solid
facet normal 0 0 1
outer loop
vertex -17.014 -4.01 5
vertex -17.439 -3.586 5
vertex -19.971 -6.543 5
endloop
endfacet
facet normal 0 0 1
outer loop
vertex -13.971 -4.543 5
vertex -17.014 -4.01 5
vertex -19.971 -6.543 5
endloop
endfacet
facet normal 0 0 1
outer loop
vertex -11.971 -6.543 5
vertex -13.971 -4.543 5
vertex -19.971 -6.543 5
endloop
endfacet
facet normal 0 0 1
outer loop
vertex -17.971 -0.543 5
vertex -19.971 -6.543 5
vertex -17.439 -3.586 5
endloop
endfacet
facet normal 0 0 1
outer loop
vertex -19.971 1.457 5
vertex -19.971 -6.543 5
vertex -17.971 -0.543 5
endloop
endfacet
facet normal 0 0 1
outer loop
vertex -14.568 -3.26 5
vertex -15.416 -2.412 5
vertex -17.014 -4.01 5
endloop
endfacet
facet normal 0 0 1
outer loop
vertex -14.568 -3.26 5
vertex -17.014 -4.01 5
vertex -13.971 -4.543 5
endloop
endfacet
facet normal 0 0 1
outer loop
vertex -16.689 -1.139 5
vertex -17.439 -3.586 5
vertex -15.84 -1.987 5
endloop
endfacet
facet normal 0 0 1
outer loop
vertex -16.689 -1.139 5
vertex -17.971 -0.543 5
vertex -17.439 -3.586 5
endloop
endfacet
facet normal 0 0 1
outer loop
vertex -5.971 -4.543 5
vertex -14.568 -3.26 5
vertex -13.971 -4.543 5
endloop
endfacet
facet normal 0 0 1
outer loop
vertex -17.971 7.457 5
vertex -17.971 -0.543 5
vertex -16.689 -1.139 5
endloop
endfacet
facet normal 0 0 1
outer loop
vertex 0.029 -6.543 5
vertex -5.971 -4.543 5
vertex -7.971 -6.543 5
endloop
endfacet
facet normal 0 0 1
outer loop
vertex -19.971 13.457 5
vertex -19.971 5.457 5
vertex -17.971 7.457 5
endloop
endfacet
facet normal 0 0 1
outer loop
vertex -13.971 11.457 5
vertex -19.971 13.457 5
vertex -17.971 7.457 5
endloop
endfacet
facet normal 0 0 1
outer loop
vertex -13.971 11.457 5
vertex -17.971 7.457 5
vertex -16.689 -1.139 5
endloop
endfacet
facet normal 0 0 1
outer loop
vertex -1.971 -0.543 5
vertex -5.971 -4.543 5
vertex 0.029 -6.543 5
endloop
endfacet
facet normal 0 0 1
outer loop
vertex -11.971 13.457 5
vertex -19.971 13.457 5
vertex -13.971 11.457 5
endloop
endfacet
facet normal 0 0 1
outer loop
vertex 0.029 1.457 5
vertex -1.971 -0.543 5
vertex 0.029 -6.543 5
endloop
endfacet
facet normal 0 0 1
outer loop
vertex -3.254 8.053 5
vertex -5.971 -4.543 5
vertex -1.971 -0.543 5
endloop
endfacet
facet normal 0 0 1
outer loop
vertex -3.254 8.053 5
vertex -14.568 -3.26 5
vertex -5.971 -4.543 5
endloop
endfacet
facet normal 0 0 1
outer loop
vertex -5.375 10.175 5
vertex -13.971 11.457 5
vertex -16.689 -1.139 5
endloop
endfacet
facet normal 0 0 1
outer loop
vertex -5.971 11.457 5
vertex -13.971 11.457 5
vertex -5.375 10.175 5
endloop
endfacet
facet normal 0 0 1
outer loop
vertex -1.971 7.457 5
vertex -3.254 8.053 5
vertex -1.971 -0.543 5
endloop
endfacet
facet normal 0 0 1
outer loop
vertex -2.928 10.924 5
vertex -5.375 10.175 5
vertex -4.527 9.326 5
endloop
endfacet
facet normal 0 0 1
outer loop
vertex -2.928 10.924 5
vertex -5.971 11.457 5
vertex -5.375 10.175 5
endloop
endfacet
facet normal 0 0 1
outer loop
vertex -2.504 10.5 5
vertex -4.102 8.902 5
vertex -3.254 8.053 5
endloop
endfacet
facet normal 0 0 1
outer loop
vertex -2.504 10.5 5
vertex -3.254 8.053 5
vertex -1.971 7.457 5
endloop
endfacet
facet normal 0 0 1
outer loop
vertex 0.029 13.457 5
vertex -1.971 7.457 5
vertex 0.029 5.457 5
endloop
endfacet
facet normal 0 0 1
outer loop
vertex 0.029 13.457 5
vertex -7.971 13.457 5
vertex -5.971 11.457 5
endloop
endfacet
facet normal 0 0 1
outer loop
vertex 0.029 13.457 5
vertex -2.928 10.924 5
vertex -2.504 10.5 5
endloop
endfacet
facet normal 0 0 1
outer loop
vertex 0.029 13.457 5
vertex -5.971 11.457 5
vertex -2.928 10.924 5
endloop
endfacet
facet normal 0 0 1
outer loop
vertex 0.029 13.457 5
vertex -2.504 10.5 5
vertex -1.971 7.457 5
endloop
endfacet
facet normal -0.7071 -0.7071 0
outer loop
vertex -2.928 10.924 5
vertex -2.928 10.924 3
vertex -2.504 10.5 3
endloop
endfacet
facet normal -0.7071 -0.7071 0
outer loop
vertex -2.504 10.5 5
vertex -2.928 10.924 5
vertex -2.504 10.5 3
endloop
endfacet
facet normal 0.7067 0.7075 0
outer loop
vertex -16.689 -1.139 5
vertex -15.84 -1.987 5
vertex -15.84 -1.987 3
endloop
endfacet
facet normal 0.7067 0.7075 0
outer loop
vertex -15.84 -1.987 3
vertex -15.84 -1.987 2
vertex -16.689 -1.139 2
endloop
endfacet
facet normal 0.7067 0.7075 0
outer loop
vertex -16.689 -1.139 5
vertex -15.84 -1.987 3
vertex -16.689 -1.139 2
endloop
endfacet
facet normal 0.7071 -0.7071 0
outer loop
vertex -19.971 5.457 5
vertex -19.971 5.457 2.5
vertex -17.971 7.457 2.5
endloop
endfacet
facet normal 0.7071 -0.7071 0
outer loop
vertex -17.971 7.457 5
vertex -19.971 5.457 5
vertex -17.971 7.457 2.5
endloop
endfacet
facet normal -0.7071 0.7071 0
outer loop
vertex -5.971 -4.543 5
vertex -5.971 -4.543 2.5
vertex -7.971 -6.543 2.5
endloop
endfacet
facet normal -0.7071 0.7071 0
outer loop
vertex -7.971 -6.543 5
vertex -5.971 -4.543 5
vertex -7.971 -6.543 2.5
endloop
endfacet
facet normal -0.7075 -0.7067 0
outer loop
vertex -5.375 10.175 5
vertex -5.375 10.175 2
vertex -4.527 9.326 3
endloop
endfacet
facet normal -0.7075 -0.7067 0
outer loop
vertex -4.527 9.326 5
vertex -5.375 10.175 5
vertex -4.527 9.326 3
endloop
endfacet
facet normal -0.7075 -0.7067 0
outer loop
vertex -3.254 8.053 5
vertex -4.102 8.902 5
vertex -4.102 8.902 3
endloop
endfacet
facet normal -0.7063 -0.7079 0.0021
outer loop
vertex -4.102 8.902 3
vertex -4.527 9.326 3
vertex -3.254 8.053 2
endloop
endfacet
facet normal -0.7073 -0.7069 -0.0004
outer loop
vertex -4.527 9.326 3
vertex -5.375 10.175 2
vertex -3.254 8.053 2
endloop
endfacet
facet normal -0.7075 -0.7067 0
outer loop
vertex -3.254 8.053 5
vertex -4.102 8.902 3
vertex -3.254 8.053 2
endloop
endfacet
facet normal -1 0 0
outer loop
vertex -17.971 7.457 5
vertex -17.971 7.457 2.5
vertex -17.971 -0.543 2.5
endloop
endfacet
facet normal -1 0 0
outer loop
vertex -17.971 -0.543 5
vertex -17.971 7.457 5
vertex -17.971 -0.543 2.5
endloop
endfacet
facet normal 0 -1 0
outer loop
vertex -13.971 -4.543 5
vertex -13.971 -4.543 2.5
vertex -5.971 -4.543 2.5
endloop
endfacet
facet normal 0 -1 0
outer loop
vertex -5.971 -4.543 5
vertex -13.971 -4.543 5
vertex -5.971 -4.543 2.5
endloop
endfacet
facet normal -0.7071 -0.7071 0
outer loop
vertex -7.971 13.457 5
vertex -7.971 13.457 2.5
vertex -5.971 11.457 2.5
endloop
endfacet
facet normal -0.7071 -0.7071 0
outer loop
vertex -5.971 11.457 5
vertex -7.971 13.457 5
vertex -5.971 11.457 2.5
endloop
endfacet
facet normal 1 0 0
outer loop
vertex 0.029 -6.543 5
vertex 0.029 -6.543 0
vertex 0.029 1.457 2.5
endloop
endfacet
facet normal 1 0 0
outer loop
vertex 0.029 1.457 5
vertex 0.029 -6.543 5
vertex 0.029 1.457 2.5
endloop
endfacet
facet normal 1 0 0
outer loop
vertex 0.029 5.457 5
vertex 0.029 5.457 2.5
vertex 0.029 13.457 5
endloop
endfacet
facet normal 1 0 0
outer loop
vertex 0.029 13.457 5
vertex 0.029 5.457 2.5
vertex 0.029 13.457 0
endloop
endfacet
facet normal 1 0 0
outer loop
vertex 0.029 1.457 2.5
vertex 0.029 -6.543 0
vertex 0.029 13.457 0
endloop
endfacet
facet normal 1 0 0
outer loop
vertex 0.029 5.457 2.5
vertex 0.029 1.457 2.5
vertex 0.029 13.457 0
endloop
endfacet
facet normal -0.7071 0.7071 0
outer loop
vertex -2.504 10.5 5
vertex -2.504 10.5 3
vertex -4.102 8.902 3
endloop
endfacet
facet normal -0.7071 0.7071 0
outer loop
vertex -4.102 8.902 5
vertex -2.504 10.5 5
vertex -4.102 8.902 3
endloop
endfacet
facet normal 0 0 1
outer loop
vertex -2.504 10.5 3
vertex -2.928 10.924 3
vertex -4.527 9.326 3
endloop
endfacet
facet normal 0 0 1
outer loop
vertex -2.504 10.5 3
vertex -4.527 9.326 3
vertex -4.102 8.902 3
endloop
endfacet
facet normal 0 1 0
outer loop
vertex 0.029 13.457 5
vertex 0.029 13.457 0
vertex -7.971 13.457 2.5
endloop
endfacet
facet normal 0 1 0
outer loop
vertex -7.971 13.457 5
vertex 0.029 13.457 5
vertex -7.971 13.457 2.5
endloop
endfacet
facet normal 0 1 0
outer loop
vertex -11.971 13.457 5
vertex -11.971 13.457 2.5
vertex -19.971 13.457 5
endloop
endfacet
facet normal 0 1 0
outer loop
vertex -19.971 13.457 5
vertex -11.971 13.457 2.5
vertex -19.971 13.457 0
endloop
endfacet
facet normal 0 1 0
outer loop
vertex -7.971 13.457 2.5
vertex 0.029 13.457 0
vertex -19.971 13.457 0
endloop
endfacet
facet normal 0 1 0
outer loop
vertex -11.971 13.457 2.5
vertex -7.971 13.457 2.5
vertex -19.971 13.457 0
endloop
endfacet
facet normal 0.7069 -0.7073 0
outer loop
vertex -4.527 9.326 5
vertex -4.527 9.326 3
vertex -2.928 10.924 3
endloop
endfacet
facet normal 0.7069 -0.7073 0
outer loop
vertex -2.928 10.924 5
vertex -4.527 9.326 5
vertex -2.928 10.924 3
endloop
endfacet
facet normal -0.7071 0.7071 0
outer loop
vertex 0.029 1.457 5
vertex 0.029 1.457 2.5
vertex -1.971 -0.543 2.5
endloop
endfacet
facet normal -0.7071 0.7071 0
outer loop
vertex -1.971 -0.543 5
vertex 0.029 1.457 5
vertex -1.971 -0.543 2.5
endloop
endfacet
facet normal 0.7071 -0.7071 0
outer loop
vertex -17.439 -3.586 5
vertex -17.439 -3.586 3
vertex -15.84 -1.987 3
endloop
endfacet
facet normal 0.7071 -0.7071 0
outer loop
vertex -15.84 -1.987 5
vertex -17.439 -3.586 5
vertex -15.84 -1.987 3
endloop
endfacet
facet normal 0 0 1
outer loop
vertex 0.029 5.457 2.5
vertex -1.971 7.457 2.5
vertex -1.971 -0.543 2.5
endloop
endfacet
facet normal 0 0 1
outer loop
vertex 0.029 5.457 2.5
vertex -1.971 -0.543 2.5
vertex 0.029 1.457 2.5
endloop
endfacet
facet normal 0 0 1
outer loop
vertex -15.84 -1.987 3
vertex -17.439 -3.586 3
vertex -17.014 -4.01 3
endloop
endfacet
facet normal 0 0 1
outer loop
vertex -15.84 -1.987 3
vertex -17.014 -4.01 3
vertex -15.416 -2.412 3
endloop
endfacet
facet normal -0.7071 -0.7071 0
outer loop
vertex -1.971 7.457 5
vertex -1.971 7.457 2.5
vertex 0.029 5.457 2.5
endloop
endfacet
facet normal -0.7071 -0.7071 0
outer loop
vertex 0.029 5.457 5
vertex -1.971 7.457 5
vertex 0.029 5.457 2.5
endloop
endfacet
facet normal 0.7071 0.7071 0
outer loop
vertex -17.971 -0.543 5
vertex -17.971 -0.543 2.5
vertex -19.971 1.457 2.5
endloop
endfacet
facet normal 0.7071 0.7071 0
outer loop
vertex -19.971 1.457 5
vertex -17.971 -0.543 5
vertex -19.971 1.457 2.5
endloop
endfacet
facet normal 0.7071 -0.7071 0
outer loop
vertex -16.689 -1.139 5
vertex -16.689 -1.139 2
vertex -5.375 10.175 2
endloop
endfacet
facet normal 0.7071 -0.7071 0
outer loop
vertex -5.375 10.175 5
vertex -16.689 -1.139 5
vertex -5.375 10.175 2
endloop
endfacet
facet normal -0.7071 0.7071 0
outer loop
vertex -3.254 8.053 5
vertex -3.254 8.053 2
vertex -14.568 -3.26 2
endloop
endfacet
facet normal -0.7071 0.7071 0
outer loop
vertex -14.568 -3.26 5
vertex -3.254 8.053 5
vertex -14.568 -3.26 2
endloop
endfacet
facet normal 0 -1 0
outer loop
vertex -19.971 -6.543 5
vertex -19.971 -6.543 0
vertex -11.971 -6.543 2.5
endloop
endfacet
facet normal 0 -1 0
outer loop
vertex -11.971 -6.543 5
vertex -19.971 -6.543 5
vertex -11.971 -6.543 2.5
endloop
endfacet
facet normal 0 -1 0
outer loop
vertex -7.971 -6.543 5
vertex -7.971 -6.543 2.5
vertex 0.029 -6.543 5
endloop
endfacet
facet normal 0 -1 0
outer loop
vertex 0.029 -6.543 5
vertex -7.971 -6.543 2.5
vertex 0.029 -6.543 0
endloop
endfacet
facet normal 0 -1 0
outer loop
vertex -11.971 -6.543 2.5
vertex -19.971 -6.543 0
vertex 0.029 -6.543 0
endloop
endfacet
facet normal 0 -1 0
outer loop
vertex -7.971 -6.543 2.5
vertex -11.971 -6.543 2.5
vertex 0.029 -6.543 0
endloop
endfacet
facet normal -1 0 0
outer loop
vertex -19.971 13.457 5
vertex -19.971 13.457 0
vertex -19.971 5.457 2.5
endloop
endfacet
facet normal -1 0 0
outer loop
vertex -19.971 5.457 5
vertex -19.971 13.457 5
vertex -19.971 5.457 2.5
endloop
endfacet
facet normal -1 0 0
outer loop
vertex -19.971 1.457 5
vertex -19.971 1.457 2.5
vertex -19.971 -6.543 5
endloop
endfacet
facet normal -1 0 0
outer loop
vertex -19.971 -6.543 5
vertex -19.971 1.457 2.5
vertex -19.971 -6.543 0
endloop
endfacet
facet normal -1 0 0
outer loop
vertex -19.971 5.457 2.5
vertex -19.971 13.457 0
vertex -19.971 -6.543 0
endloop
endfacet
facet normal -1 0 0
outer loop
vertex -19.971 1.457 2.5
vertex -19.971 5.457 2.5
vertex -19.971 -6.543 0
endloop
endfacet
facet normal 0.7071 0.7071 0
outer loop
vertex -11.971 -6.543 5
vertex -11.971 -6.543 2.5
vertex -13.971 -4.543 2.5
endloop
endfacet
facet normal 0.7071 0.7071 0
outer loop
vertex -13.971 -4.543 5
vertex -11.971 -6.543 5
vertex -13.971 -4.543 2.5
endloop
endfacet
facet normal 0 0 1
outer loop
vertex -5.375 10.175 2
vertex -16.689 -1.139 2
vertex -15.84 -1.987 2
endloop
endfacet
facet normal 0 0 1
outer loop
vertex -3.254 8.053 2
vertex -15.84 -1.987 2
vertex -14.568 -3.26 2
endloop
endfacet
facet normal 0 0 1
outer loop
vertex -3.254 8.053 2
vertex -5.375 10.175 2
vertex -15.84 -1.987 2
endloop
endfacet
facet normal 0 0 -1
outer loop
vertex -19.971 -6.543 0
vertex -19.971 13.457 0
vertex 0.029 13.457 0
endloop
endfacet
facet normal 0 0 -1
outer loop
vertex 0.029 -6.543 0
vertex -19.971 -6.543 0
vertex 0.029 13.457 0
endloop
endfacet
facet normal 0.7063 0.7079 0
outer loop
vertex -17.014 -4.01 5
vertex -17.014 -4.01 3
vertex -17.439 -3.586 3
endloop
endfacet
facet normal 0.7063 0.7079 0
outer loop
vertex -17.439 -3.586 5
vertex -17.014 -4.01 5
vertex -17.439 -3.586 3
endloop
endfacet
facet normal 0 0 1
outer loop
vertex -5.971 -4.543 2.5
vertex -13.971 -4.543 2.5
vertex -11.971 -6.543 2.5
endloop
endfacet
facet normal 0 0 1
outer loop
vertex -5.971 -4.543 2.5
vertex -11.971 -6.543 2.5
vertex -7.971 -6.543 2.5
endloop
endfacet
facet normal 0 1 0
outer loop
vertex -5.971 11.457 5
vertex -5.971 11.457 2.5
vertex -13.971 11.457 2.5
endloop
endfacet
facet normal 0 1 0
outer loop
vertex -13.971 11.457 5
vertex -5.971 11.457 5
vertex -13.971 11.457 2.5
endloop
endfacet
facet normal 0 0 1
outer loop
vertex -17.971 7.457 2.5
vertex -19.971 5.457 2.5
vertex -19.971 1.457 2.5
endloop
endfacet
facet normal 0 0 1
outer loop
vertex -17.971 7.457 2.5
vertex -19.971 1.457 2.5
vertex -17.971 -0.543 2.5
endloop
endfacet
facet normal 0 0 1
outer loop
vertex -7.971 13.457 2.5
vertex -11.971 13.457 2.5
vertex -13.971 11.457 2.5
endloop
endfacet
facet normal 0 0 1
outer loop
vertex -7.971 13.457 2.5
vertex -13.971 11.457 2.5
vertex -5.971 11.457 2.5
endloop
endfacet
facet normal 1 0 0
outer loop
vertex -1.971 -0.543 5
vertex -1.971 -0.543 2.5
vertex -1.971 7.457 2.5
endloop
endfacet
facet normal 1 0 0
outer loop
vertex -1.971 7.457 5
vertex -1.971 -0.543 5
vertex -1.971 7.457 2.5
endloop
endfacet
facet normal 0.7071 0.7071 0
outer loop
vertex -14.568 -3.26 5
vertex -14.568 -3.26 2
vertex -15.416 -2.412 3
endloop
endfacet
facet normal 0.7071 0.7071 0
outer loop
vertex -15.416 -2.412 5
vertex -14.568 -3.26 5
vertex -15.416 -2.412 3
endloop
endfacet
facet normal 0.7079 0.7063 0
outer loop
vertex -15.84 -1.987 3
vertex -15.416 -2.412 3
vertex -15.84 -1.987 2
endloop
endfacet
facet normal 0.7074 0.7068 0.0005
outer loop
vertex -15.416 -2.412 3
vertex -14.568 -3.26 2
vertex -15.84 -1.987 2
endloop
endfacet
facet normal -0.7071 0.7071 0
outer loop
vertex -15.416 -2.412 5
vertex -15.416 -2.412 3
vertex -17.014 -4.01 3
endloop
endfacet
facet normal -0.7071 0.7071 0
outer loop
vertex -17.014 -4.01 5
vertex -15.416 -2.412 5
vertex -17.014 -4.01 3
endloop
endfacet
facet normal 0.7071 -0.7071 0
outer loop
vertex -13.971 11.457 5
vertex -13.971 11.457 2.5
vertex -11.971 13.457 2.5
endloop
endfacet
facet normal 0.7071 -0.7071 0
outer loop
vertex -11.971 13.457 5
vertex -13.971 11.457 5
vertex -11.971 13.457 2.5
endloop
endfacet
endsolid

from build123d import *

# Parameters (mm, degrees)
F1_DEPTH = 5
F2_DEPTH = 2
F3_DEPTH = 3
F4_DEPTH = 2.5


with BuildPart() as f1:
    # F0 (on Top) → F1 (new body)
    with BuildSketch(Plane.XY):
        Polygon((-5.9713595426, 11.4572308195), (-13.9713595426, 11.4572308195), (-17.9713595426, 11.4572308195), (-17.9713595426, 7.4572308195), (-17.9713595426, -0.5427691805), (-17.9713595426, -2.421448837), (-16.6888739638, -1.1389632582), (-5.3751654648, 10.1747452407), (-4.0926798861, 11.4572308195), align=None)
        Polygon((-2.3956236113, 11.4572308195), (-4.0926798861, 11.4572308195), (-5.3751654648, 10.1747452407), (-4.5266373274, 9.3262171033), (-2.9283770403, 10.9244773904), align=None)
        Polygon((-3.2538451213, 8.0534248972), (-1.9713595426, 9.3359104759), (-1.9713595426, 11.0329667508), (-2.5041129716, 10.5002133217), (-4.1023732587, 8.9019530346), align=None)
        Polygon((-1.9713595426, -0.5427691805), (-1.9713595426, 7.4572308195), (-1.9713595426, 9.3359104759), (-3.2538451213, 8.0534248972), (-14.5675536203, -3.2602836018), (-15.850039199, -4.5427691805), (-13.9713595426, -4.5427691805), (-5.9713595426, -4.5427691805), (-1.9713595426, -4.5427691805), align=None)
        Polygon((-17.5470954738, -4.5427691805), (-15.850039199, -4.5427691805), (-14.5675536203, -3.2602836018), (-15.4160817577, -2.4117554644), (-17.0143420448, -4.0100157515), align=None)
        Polygon((-16.6888739638, -1.1389632582), (-17.9713595426, -2.421448837), (-17.9713595426, -4.1185051118), (-17.4386061135, -3.5857516828), (-15.8403458264, -1.9874913957), align=None)
        Polygon((-1.9713595426, 11.4572308195), (-2.3956236113, 11.4572308195), (-2.9283770403, 10.9244773904), (-2.5041129716, 10.5002133217), (-1.9713595426, 11.0329667508), align=None)
        Polygon((-17.4386061135, -3.5857516828), (-17.9713595426, -4.1185051118), (-17.9713595426, -4.5427691805), (-17.5470954738, -4.5427691805), (-17.0143420448, -4.0100157515), align=None)
        Polygon((0.0286404574, -6.5427691805), (0.0286404574, 1.4572308195), (-1.9713595426, -0.5427691805), (-1.9713595426, -4.5427691805), (-5.9713595426, -4.5427691805), (-7.9713595426, -6.5427691805), align=None)
        Polygon((0.0286404574, 13.4572308195), (-7.9713595426, 13.4572308195), (-5.9713595426, 11.4572308195), (-4.0926798861, 11.4572308195), (-2.3956236113, 11.4572308195), (-1.9713595426, 11.4572308195), (-1.9713595426, 11.0329667508), (-1.9713595426, 9.3359104759), (-1.9713595426, 7.4572308195), (0.0286404574, 5.4572308195), align=None)
        Polygon((-11.9713595426, 13.4572308195), (-19.9713595426, 13.4572308195), (-19.9713595426, 5.4572308195), (-17.9713595426, 7.4572308195), (-17.9713595426, 11.4572308195), (-13.9713595426, 11.4572308195), align=None)
        Polygon((-17.9713595426, -0.5427691805), (-19.9713595426, 1.4572308195), (-19.9713595426, -6.5427691805), (-11.9713595426, -6.5427691805), (-13.9713595426, -4.5427691805), (-15.850039199, -4.5427691805), (-17.5470954738, -4.5427691805), (-17.9713595426, -4.5427691805), (-17.9713595426, -4.1185051118), (-17.9713595426, -2.421448837), align=None)
    extrude(amount=F1_DEPTH)

    # F0 (on Top) → F2 (join)
    with BuildSketch(Plane.XY):
        Polygon((-4.5266373274, 9.3262171033), (-5.3751654648, 10.1747452407), (-16.6888739638, -1.1389632582), (-15.8403458264, -1.9874913957), (-15.4160817577, -2.4117554644), (-14.5675536203, -3.2602836018), (-3.2538451213, 8.0534248972), (-4.1023732587, 8.9019530346), align=None)
    extrude(amount=F2_DEPTH)

    # F0 (on Top) → F3 (join)
    with BuildSketch(Plane.XY):
        Polygon((-15.8403458264, -1.9874913957), (-17.4386061135, -3.5857516828), (-17.0143420448, -4.0100157515), (-15.4160817577, -2.4117554644), align=None)
        Polygon((-2.5041129716, 10.5002133217), (-2.9283770403, 10.9244773904), (-4.5266373274, 9.3262171033), (-4.1023732587, 8.9019530346), align=None)
    extrude(amount=F3_DEPTH)

    # F0 (on Top) → F4 (join)
    with BuildSketch(Plane.XY):
        Polygon((-13.9713595426, -4.5427691805), (-11.9713595426, -6.5427691805), (-7.9713595426, -6.5427691805), (-5.9713595426, -4.5427691805), align=None)
        Polygon((-17.9713595426, 7.4572308195), (-19.9713595426, 5.4572308195), (-19.9713595426, 1.4572308195), (-17.9713595426, -0.5427691805), align=None)
        Polygon((-7.9713595426, 13.4572308195), (-11.9713595426, 13.4572308195), (-13.9713595426, 11.4572308195), (-5.9713595426, 11.4572308195), align=None)
        Polygon((0.0286404574, 1.4572308195), (0.0286404574, 5.4572308195), (-1.9713595426, 7.4572308195), (-1.9713595426, -0.5427691805), align=None)
    extrude(amount=F4_DEPTH)


solid = f1.part
